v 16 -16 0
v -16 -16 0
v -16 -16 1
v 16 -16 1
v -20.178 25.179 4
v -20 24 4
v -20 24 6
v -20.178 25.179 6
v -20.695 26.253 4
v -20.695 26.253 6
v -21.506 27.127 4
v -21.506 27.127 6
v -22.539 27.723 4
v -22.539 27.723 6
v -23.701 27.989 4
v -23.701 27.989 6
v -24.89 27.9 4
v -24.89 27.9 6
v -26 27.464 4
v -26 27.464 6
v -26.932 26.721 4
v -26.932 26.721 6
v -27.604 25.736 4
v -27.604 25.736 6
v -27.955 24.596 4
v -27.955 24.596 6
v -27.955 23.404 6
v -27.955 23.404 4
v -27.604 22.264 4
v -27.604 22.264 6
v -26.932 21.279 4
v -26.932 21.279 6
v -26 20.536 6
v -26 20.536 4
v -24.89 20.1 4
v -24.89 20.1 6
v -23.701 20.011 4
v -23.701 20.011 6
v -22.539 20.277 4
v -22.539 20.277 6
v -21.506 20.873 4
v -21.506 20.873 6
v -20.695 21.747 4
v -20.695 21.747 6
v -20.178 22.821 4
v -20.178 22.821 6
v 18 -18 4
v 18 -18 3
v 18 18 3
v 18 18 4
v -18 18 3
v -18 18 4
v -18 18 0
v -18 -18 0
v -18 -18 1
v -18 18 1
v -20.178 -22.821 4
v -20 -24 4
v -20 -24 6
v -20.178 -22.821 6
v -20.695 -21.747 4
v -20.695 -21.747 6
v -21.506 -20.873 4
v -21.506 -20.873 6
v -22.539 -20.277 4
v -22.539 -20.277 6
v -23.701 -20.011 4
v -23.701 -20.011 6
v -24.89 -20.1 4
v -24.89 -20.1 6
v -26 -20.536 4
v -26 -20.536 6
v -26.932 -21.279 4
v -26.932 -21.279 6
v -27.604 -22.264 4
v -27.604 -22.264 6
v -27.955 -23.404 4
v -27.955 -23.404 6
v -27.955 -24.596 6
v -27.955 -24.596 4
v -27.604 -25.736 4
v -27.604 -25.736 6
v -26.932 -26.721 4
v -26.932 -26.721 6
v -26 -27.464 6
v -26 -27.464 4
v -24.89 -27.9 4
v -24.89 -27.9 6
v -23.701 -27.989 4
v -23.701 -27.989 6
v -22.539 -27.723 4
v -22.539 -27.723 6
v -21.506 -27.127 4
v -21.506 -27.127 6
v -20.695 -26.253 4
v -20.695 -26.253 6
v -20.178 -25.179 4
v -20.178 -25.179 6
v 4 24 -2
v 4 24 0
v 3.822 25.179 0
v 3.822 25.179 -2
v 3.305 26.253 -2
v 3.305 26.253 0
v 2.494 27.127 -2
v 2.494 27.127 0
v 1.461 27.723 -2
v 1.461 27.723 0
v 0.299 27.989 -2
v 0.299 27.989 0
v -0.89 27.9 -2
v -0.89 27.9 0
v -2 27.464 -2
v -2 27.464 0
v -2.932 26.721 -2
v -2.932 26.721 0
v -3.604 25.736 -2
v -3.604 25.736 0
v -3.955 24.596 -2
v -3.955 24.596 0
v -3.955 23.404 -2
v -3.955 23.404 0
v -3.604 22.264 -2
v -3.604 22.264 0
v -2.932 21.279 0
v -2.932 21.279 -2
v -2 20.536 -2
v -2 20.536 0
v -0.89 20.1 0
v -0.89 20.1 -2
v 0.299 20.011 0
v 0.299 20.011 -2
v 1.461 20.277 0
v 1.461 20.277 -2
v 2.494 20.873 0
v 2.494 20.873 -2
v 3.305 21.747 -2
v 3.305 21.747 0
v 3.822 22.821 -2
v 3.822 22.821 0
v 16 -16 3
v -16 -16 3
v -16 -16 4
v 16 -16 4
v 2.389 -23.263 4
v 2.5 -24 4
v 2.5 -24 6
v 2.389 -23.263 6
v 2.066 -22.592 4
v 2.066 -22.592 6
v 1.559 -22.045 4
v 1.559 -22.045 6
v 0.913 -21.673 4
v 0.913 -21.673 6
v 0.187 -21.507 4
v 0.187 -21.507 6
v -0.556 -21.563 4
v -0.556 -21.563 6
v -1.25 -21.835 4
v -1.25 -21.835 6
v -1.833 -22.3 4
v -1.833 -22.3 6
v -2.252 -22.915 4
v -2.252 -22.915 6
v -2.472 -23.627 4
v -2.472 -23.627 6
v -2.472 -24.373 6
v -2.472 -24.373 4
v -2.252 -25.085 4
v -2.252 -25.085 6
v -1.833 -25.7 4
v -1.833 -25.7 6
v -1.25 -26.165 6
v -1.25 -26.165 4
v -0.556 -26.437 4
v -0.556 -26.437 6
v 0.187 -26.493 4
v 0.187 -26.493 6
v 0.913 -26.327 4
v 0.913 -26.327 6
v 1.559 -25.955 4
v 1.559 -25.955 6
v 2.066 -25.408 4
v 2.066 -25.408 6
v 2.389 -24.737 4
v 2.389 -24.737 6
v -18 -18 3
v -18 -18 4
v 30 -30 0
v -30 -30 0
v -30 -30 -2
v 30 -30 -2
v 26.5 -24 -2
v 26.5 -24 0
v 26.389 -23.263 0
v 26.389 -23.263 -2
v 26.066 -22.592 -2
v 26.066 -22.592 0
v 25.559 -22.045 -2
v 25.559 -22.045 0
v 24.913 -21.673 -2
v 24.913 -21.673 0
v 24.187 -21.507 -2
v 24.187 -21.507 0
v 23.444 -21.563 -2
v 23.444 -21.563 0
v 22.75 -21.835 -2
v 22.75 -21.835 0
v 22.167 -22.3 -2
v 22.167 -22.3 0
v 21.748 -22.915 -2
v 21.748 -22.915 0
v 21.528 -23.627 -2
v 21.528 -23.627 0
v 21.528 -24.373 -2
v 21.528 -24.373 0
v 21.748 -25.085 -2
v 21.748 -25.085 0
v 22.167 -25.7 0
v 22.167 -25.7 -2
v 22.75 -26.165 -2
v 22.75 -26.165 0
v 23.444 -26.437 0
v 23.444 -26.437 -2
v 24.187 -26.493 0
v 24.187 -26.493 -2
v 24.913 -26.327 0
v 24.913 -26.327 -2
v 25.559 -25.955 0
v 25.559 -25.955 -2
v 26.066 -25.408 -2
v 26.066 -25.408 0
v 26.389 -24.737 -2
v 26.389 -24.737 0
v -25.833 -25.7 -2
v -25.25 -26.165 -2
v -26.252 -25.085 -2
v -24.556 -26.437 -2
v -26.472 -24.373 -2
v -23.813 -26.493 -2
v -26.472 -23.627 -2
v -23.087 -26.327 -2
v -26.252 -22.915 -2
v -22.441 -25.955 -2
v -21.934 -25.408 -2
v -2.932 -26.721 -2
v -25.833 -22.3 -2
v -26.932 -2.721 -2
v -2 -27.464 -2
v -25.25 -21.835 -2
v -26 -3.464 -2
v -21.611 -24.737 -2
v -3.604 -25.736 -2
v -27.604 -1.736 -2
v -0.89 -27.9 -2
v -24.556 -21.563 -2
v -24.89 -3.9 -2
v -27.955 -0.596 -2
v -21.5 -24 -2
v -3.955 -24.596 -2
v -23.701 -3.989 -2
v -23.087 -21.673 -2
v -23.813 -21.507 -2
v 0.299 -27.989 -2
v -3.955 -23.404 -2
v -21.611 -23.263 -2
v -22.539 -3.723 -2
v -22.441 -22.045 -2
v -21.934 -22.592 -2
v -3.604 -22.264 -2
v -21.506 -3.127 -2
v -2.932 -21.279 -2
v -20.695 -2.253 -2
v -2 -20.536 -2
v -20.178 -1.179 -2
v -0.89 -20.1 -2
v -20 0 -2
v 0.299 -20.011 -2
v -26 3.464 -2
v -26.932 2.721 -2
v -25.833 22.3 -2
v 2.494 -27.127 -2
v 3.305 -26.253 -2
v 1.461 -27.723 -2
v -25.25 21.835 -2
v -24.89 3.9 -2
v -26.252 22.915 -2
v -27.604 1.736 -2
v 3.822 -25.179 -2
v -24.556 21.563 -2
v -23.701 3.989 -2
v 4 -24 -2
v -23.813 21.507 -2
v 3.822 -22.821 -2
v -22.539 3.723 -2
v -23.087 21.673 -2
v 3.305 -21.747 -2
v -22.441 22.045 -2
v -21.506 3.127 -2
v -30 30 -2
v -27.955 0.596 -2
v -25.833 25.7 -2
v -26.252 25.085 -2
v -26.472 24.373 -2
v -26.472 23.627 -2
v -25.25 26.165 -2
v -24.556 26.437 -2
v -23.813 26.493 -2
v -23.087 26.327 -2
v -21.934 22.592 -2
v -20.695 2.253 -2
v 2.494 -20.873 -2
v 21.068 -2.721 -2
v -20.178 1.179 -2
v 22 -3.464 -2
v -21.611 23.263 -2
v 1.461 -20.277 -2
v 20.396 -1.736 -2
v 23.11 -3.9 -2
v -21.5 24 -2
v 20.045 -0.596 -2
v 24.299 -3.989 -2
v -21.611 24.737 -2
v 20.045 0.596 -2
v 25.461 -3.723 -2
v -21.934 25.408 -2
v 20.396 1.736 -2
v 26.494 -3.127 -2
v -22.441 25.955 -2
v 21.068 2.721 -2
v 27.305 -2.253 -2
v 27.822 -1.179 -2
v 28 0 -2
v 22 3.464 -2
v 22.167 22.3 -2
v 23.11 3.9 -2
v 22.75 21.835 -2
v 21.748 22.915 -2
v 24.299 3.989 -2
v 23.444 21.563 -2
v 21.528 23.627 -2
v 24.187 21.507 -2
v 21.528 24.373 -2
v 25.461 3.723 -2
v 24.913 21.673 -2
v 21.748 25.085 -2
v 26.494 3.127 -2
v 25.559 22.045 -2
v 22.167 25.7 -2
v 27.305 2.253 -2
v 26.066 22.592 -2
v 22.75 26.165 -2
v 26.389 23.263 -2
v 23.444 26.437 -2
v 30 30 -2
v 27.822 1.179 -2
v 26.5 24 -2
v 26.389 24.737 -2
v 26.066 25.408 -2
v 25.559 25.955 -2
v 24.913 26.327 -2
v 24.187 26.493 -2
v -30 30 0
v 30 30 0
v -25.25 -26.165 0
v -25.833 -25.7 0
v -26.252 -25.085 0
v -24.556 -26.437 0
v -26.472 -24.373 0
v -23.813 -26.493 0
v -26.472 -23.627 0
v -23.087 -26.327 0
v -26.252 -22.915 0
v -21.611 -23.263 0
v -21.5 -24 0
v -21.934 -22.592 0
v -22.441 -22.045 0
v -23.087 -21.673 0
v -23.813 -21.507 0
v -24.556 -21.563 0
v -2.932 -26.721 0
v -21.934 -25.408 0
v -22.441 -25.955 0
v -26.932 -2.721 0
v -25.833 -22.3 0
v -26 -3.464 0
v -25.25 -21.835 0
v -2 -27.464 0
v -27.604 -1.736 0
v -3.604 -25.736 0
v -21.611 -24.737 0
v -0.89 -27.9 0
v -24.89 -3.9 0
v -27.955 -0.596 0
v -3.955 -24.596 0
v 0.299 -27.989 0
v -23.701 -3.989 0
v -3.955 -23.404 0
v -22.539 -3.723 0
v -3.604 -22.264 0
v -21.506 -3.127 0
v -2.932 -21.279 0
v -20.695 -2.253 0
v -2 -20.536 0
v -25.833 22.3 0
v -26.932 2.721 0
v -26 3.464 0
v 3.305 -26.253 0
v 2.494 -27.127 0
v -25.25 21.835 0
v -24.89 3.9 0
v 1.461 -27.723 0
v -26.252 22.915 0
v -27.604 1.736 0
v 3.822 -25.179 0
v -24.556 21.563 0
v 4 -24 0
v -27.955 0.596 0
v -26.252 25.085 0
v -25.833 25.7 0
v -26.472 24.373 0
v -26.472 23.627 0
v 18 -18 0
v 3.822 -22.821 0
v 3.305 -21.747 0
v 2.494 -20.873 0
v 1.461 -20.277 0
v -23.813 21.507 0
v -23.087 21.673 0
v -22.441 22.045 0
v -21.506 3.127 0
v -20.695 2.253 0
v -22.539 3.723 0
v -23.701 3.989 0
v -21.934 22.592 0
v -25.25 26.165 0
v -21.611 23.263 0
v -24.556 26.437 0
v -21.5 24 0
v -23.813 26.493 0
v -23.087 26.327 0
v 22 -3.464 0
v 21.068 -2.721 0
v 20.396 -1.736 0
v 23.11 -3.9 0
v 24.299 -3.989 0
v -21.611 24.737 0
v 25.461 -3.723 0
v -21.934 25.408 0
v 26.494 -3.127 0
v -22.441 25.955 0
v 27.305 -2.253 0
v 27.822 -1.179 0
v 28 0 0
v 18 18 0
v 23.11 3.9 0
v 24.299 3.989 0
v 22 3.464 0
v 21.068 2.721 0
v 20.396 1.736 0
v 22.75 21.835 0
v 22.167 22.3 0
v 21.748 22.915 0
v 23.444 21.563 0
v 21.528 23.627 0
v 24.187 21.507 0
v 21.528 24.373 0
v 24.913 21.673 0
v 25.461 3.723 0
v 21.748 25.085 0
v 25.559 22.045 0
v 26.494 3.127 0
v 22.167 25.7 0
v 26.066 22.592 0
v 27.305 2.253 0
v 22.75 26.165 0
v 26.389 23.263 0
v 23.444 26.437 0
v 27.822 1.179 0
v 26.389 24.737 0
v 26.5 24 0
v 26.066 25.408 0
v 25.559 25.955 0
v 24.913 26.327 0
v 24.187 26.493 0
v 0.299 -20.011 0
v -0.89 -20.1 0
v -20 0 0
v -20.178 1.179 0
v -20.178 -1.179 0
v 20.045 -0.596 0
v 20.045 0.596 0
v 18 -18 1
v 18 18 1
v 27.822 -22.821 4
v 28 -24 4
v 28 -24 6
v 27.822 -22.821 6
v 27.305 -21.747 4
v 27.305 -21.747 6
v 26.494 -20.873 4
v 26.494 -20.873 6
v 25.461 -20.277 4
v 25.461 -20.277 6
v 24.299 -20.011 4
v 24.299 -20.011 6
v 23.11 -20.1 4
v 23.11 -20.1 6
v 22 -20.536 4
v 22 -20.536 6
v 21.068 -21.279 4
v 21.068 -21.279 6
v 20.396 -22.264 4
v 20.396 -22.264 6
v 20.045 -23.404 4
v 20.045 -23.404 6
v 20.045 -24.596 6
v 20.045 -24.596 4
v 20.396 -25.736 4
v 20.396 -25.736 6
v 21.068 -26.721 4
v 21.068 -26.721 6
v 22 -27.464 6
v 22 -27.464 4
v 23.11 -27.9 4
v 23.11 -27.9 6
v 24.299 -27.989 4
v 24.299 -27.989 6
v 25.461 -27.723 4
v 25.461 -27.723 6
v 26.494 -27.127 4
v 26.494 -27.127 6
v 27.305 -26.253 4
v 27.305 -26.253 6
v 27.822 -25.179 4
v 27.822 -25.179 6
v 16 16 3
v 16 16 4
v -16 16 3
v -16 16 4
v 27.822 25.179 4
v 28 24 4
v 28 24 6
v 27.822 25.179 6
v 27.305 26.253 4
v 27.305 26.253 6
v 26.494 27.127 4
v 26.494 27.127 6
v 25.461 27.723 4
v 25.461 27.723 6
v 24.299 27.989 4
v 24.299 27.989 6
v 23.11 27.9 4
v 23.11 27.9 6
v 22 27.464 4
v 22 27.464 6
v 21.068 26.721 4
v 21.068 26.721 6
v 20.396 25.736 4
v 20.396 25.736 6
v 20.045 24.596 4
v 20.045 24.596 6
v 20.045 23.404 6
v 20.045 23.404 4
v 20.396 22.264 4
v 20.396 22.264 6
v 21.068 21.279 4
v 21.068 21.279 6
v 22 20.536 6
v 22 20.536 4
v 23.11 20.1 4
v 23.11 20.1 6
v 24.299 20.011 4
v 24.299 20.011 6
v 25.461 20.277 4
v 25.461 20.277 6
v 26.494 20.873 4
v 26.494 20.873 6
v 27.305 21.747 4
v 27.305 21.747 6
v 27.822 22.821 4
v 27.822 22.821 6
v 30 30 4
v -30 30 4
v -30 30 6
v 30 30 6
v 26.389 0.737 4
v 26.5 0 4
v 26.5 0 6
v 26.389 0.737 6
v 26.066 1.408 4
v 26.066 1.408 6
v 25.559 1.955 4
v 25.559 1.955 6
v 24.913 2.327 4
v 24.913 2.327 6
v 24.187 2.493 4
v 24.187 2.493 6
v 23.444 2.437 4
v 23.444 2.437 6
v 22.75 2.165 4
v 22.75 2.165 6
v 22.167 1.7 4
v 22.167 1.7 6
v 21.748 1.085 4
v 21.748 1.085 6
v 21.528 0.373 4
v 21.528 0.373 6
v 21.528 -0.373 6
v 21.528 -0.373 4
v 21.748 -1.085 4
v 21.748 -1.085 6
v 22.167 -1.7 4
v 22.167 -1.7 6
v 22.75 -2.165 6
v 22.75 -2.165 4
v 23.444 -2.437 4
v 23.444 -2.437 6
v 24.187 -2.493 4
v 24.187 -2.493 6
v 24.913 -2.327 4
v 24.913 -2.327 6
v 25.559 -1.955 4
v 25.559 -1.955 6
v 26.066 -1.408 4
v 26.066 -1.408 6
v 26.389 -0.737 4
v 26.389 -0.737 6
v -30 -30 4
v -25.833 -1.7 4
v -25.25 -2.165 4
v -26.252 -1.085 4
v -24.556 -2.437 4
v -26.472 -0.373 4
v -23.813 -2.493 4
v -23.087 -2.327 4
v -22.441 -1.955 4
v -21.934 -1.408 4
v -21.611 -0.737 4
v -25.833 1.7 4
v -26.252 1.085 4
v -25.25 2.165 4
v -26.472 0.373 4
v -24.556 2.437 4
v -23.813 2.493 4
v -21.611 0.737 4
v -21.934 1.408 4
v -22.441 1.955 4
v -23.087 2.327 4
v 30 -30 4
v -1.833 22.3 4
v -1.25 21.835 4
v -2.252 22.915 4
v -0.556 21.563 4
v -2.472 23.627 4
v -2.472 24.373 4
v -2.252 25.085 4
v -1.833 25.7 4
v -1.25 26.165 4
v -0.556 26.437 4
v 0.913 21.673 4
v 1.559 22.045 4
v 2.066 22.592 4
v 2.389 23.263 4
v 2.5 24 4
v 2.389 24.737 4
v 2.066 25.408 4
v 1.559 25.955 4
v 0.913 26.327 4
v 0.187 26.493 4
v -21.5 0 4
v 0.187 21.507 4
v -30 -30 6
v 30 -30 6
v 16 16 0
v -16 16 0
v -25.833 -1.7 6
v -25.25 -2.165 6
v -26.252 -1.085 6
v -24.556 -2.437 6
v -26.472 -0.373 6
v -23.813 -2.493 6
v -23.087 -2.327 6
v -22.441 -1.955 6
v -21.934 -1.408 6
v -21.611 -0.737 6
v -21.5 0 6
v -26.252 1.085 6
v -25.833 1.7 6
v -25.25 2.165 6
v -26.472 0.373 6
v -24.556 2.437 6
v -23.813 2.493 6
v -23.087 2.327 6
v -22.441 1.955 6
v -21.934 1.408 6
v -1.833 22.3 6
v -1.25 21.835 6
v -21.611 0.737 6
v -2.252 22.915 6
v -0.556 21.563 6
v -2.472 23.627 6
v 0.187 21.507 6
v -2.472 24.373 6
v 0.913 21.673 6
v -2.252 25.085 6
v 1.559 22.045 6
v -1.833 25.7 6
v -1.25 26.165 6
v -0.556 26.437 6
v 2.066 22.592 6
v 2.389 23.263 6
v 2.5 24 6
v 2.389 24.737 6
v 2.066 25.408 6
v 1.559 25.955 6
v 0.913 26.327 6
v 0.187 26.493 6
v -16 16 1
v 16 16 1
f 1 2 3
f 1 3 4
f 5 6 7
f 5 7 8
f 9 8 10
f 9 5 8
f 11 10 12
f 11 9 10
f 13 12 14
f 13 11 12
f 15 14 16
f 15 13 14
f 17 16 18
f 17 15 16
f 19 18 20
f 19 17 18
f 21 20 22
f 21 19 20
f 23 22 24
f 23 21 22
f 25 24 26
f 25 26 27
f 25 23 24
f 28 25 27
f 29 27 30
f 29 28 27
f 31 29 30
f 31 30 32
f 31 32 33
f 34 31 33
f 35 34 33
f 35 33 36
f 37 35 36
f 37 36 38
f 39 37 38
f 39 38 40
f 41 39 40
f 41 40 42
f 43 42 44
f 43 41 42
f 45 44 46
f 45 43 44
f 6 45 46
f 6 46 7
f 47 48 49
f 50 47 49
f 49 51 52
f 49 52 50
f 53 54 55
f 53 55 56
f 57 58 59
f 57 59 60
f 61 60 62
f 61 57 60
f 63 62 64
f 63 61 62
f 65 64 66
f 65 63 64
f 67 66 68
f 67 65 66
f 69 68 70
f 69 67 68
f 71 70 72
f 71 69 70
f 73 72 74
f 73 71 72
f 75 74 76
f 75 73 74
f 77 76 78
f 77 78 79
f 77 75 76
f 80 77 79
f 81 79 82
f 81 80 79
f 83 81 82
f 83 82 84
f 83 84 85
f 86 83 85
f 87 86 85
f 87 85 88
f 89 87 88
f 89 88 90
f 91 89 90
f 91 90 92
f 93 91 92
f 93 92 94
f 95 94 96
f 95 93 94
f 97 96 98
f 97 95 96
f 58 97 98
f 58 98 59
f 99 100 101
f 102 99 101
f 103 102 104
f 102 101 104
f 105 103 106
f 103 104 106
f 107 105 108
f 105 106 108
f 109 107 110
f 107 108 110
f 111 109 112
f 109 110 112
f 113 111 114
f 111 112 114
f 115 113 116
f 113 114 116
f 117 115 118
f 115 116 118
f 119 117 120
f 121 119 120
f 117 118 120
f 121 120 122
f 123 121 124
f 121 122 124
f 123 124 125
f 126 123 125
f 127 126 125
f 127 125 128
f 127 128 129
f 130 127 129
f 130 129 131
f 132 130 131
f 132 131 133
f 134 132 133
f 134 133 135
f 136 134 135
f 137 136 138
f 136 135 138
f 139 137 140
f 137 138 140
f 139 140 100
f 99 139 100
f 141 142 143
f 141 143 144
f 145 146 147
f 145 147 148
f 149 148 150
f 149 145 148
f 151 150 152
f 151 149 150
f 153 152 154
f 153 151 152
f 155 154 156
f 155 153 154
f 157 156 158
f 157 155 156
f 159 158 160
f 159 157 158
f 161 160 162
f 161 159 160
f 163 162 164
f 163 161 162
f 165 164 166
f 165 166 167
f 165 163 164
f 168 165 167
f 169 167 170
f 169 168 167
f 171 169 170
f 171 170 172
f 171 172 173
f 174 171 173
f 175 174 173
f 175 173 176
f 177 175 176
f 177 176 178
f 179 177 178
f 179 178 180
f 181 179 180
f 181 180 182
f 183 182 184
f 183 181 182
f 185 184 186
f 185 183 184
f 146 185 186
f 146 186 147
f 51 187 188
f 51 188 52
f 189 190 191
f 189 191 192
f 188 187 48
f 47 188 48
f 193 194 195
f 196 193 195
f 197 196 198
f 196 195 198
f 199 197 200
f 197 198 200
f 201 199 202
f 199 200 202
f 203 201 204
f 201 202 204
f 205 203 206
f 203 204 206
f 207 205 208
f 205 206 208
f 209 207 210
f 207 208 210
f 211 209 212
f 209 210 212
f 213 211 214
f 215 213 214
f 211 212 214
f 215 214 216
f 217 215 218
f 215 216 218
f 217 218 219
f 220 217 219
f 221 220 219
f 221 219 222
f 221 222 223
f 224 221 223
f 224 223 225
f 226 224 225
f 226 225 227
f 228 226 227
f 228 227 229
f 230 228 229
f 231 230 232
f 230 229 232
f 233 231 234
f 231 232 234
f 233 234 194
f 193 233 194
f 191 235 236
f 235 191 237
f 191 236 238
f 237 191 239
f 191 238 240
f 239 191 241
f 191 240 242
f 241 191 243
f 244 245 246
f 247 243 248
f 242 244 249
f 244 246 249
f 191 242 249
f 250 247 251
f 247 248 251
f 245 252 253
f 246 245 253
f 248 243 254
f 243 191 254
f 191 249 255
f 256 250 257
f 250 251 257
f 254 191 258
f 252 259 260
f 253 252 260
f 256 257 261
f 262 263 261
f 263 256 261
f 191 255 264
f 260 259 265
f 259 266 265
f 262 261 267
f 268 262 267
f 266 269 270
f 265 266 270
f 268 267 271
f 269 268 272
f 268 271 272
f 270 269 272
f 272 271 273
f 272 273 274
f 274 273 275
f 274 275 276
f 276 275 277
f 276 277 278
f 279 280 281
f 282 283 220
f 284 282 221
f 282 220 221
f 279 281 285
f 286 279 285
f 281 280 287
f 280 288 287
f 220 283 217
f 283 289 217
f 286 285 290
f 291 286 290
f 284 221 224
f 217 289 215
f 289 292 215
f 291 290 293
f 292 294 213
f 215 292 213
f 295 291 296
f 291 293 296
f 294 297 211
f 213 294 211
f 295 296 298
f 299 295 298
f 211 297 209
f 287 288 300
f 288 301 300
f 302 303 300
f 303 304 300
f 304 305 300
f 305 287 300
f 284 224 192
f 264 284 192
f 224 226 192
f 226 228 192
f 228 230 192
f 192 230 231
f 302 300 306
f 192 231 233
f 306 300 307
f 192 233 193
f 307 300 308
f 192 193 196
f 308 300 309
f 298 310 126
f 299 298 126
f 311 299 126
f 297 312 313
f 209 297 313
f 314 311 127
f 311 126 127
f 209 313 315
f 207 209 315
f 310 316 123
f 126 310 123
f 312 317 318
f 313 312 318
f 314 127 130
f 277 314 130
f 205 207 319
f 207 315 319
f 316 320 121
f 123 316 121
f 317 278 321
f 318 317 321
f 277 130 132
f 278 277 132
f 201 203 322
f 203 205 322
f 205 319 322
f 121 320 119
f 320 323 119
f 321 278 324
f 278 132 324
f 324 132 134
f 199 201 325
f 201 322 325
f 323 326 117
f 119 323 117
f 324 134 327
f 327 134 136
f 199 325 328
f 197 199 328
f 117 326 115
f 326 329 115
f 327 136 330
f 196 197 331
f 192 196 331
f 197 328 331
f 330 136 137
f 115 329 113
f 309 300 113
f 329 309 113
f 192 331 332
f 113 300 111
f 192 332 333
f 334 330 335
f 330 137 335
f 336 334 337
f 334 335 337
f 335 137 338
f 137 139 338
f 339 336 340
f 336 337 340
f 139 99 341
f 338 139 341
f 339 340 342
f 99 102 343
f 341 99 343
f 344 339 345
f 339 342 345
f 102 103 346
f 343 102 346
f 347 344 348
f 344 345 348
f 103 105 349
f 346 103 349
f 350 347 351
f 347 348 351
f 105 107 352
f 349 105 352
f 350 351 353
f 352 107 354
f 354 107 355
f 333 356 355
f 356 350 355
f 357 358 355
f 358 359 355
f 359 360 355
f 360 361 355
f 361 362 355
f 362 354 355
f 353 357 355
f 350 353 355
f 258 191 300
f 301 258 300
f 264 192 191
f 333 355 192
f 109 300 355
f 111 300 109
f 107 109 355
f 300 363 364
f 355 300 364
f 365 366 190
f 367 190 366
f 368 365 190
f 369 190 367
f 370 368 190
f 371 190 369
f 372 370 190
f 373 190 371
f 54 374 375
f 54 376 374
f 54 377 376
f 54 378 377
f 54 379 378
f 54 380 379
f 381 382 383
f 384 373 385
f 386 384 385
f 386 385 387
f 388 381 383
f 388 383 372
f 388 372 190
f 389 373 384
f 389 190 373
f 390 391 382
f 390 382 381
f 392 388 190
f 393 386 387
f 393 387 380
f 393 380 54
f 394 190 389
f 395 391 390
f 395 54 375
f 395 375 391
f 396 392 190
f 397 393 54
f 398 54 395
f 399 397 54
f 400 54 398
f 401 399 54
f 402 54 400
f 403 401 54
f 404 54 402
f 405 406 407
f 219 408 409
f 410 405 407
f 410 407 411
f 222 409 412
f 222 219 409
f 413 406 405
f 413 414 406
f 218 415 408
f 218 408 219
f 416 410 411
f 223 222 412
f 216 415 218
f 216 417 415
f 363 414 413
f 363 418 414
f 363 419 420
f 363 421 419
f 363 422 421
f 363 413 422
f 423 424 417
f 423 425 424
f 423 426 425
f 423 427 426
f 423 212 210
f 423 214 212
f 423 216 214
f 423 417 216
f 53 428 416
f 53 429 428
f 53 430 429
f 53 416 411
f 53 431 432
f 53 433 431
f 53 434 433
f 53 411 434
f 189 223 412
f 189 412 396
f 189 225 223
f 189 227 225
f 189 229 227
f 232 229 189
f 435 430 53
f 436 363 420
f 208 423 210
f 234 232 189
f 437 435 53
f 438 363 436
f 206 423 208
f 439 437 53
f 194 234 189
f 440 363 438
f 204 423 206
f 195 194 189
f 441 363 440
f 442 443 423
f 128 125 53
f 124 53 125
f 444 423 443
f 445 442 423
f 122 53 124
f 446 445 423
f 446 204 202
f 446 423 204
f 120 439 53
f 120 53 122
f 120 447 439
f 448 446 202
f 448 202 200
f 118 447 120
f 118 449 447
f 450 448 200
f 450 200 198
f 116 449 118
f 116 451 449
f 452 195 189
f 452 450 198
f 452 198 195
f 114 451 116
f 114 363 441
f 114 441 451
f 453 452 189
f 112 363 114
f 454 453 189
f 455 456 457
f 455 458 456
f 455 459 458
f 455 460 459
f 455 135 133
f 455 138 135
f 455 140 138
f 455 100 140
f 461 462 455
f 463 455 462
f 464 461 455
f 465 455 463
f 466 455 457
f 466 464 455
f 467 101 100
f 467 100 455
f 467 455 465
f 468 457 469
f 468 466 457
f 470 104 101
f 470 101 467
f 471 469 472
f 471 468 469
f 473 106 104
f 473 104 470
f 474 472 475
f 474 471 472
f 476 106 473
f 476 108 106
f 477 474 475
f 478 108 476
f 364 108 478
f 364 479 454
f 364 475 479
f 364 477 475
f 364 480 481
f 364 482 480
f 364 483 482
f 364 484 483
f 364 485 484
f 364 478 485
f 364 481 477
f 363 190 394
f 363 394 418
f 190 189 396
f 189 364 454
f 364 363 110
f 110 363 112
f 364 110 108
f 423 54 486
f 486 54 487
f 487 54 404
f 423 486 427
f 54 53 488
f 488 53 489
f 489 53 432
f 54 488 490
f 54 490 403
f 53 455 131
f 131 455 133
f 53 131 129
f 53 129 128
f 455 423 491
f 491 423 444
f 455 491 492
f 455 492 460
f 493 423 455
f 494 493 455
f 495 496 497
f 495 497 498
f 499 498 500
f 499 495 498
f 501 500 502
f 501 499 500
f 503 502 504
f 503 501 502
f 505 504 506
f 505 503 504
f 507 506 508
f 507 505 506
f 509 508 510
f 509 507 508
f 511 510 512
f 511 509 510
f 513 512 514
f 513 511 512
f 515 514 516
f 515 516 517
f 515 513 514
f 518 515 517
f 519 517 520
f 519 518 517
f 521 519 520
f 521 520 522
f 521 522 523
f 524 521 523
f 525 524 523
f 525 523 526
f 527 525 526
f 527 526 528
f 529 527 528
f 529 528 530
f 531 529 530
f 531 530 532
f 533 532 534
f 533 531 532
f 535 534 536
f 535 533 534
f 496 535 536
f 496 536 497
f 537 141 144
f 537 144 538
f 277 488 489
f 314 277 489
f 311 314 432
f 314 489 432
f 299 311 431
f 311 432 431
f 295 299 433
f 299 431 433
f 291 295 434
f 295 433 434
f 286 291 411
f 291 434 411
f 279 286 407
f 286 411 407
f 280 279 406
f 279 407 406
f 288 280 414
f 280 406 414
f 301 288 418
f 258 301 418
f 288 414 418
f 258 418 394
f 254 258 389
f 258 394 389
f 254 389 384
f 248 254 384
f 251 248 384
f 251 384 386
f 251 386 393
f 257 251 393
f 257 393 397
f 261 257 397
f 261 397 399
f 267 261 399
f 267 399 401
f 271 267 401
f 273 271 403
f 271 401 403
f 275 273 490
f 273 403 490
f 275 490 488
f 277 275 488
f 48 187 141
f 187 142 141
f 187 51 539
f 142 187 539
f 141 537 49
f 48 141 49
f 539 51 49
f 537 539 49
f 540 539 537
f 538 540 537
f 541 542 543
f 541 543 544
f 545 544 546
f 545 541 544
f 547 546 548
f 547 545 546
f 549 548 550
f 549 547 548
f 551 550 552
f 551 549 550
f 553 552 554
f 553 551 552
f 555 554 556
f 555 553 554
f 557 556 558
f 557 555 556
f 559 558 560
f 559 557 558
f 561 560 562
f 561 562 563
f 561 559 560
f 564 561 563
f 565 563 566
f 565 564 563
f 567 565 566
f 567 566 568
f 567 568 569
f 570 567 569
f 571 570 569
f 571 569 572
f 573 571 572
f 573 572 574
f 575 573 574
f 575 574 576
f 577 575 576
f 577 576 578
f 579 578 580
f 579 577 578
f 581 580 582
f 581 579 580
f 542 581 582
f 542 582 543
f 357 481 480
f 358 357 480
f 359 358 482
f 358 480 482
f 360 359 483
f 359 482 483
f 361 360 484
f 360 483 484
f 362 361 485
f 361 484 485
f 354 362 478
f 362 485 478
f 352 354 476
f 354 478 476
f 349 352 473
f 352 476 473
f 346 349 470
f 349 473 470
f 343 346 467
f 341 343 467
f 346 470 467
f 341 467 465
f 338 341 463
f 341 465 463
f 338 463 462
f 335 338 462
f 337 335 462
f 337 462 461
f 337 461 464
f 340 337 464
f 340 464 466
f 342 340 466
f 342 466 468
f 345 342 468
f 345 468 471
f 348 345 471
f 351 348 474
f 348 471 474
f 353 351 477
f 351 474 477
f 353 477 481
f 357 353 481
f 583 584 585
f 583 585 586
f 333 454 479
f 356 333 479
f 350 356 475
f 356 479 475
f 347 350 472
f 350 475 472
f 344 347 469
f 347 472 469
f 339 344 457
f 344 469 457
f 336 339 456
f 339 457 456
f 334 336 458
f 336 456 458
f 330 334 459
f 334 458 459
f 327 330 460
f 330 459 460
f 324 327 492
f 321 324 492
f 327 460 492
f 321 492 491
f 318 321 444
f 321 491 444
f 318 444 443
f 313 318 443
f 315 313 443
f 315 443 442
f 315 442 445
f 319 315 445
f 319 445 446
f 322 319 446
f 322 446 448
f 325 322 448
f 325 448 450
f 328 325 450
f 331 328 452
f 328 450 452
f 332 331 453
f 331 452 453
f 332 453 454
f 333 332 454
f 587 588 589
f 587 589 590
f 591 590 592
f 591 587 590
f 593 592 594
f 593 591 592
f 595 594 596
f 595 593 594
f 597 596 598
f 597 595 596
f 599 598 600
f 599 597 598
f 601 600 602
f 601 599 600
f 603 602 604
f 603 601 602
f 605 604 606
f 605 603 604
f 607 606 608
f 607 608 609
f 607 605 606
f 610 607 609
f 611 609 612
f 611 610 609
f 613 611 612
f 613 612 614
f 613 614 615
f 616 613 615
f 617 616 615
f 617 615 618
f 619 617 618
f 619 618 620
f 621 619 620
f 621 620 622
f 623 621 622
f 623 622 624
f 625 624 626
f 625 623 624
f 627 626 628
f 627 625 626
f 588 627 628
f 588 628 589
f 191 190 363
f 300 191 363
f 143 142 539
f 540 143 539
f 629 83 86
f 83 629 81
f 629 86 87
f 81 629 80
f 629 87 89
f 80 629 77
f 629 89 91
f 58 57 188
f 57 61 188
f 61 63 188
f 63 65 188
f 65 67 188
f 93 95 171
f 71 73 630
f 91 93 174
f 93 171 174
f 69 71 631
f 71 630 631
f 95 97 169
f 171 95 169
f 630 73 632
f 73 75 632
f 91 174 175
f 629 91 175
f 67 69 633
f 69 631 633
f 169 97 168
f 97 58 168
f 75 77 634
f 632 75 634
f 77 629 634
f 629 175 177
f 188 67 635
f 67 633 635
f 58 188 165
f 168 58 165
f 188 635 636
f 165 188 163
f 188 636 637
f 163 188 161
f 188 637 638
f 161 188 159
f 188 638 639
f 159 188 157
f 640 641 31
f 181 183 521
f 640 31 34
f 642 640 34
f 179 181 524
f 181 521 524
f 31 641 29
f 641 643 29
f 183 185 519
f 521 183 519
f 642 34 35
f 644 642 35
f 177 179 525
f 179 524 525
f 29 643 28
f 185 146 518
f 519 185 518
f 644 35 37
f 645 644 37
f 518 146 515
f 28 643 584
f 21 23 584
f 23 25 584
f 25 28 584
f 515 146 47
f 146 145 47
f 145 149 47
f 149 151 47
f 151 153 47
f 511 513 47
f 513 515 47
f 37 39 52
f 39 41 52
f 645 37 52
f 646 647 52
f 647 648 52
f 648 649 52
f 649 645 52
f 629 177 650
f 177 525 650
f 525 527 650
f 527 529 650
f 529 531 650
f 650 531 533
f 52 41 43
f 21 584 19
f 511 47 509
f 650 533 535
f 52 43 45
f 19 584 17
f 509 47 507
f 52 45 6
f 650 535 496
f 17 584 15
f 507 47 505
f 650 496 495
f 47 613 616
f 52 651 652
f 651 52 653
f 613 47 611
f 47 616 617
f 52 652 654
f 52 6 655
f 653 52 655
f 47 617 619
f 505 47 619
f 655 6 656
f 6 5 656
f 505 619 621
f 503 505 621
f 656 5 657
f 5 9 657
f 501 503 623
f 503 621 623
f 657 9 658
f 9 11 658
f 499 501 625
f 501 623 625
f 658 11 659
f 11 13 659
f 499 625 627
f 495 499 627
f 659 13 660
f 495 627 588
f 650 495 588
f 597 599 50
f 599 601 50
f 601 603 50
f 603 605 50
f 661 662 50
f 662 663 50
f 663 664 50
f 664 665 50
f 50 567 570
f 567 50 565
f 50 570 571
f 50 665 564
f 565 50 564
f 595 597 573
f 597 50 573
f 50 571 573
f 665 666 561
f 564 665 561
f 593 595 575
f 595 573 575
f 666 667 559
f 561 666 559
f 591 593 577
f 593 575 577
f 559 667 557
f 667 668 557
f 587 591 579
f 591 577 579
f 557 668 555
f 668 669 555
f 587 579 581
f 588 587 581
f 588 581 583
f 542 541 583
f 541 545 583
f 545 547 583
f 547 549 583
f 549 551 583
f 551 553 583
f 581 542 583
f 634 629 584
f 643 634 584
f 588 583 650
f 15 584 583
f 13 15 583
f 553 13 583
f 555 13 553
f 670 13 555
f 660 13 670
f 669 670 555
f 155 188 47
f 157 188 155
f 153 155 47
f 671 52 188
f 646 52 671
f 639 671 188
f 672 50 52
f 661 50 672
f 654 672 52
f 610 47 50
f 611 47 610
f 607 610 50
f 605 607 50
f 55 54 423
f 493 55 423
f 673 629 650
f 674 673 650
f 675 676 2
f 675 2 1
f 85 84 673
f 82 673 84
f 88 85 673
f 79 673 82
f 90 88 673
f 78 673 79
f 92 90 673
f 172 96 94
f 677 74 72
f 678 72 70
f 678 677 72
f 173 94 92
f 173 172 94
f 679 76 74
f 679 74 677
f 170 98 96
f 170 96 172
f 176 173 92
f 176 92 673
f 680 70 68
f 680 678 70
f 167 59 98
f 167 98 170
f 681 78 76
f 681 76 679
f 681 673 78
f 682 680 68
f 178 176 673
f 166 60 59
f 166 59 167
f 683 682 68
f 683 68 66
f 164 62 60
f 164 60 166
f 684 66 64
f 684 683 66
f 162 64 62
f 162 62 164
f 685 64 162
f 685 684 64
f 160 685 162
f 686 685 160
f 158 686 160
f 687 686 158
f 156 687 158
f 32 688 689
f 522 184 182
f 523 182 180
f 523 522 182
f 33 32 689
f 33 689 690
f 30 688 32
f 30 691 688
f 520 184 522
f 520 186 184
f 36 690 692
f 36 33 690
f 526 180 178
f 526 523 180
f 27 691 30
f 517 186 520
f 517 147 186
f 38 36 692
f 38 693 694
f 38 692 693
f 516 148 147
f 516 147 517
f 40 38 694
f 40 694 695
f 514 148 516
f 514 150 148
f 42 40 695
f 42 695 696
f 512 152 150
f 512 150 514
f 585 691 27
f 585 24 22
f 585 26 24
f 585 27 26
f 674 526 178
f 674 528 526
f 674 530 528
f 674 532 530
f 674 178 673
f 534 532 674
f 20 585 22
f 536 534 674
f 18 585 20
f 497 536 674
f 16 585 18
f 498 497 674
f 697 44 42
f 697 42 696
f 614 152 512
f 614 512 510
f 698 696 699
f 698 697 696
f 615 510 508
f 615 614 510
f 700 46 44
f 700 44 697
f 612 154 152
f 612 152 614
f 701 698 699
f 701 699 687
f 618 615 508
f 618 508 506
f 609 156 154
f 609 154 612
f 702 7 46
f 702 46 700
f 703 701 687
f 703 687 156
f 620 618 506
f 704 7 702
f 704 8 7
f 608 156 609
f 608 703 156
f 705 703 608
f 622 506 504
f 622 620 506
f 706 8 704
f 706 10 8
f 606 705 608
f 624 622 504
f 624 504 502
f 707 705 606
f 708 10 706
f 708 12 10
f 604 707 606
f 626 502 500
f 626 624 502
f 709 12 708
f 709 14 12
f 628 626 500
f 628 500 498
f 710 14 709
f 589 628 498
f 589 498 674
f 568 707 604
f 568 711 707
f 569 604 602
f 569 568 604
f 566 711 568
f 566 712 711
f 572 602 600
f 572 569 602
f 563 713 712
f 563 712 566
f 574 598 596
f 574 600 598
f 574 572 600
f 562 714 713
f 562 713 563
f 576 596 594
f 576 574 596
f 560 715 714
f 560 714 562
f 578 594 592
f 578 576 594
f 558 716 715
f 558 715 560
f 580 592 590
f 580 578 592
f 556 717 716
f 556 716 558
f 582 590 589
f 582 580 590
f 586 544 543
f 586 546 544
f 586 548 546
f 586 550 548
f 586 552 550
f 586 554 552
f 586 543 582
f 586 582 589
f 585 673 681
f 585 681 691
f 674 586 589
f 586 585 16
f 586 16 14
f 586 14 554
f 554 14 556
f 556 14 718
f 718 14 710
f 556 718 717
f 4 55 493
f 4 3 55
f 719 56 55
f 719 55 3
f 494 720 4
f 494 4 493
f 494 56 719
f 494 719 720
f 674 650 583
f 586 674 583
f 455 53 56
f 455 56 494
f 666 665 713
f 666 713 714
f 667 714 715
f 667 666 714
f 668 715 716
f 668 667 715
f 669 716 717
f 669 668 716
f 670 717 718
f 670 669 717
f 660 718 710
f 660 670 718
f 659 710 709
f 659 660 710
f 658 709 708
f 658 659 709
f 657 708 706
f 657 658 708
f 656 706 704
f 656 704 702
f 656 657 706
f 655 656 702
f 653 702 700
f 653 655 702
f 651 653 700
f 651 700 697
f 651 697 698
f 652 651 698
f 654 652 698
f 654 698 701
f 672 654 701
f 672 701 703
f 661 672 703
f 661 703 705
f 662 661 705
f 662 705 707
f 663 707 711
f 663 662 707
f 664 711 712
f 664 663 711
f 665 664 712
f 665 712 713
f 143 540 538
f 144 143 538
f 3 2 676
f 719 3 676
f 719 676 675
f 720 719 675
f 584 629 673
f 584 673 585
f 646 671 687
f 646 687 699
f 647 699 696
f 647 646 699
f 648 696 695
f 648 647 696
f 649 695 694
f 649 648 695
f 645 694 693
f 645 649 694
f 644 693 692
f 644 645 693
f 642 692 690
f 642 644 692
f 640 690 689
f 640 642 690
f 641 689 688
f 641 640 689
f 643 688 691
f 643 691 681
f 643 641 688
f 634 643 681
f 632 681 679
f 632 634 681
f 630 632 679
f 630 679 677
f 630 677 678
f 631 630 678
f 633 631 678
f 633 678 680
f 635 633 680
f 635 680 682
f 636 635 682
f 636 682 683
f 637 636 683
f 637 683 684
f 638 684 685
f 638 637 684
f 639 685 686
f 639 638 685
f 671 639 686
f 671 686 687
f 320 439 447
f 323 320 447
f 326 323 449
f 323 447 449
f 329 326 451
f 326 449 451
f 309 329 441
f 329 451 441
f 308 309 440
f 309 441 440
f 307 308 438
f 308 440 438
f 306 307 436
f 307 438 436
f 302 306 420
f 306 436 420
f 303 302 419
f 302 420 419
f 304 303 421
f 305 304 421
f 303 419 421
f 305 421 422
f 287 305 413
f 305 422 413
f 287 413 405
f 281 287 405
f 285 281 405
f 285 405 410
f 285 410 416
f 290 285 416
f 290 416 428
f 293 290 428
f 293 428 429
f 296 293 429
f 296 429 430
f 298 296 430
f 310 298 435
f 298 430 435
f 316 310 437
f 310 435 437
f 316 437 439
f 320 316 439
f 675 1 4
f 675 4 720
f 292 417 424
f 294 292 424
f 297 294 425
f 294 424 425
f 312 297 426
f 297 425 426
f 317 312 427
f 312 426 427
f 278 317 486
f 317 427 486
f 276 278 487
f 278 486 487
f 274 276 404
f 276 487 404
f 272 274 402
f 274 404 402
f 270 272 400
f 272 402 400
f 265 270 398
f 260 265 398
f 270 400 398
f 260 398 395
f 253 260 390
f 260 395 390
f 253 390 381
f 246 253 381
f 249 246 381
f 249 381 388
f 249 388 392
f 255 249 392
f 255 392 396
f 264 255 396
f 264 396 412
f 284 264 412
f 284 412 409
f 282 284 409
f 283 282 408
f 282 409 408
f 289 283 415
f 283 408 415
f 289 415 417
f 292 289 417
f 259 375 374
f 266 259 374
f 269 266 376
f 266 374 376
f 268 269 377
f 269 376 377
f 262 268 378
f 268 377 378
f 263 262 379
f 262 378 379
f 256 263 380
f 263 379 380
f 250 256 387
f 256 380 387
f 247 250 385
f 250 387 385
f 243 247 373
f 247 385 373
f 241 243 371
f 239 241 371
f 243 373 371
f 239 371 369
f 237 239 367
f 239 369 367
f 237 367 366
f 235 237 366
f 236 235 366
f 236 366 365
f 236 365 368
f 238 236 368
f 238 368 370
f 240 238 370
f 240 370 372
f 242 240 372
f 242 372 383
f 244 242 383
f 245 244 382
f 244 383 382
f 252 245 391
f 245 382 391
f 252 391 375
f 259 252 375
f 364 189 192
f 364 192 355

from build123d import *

# Parameters (mm, degrees)
F0_W     = 60
F0_H     = 60
F0_R     = 4
F0_W_2   = 36
F0_H_2   = 36
F0_W_3   = 32
F0_H_3   = 32
F0_R_2   = 2.5
F1_DEPTH = 2
F2_DEPTH = 1
F3_START = 4
F3_DEPTH = 2
F4_START = 3
F4_DEPTH = 1


with BuildPart() as f1:
    # F0 (on Top) → F1 (new body)
    with BuildSketch(Plane.XY):
        Rectangle(F0_W, F0_H)
        with Locations((-24, -24)):
            Circle(F0_R, mode=Mode.SUBTRACT)
        with Locations((0, -24)):
            Circle(F0_R, mode=Mode.SUBTRACT)
        with Locations((24, -24)):
            Circle(F0_R, mode=Mode.SUBTRACT)
        with Locations((-24, 0)):
            Circle(F0_R, mode=Mode.SUBTRACT)
        with Locations((-24, 24)):
            Circle(F0_R, mode=Mode.SUBTRACT)
        Rectangle(F0_W_2, F0_H_2, mode=Mode.SUBTRACT)
        with Locations((24, 0)):
            Circle(F0_R, mode=Mode.SUBTRACT)
        with Locations((0, 24)):
            Circle(F0_R, mode=Mode.SUBTRACT)
        with Locations((24, 24)):
            Circle(F0_R, mode=Mode.SUBTRACT)
        Rectangle(F0_W_2, F0_H_2)
        Rectangle(F0_W_3, F0_H_3, mode=Mode.SUBTRACT)
        Rectangle(F0_W_3, F0_H_3)
        with Locations((-24, 24)):
            Circle(F0_R)
        with Locations((-24, 24)):
            Circle(F0_R_2, mode=Mode.SUBTRACT)
        with Locations((24, 24)):
            Circle(F0_R)
        with Locations((24, 24)):
            Circle(F0_R_2, mode=Mode.SUBTRACT)
        with Locations((24, -24)):
            Circle(F0_R)
        with Locations((24, -24)):
            Circle(F0_R_2, mode=Mode.SUBTRACT)
        with Locations((-24, -24)):
            Circle(F0_R)
        with Locations((-24, -24)):
            Circle(F0_R_2, mode=Mode.SUBTRACT)
    extrude(amount=-F1_DEPTH)

    # F0 (on Top) → F2 (join)
    with BuildSketch(Plane.XY):
        Rectangle(F0_W_2, F0_H_2)
        Rectangle(F0_W_3, F0_H_3, mode=Mode.SUBTRACT)
    extrude(amount=F2_DEPTH)


with BuildPart() as f3:
    # F0 (on Top) → F3 (new body)
    with BuildSketch(Plane.XY.offset(F3_START)):
        Rectangle(F0_W, F0_H)
        with Locations((-24, -24)):
            Circle(F0_R, mode=Mode.SUBTRACT)
        with Locations((0, -24)):
            Circle(F0_R, mode=Mode.SUBTRACT)
        with Locations((24, -24)):
            Circle(F0_R, mode=Mode.SUBTRACT)
        with Locations((-24, 0)):
            Circle(F0_R, mode=Mode.SUBTRACT)
        with Locations((-24, 24)):
            Circle(F0_R, mode=Mode.SUBTRACT)
        Rectangle(F0_W_2, F0_H_2, mode=Mode.SUBTRACT)
        with Locations((24, 0)):
            Circle(F0_R, mode=Mode.SUBTRACT)
        with Locations((0, 24)):
            Circle(F0_R, mode=Mode.SUBTRACT)
        with Locations((24, 24)):
            Circle(F0_R, mode=Mode.SUBTRACT)
        Rectangle(F0_W_2, F0_H_2)
        Rectangle(F0_W_3, F0_H_3, mode=Mode.SUBTRACT)
        Rectangle(F0_W_3, F0_H_3)
        with Locations((-24, 0)):
            Circle(F0_R)
        with Locations((-24, 0)):
            Circle(F0_R_2, mode=Mode.SUBTRACT)
        with Locations((0, 24)):
            Circle(F0_R)
        with Locations((0, 24)):
            Circle(F0_R_2, mode=Mode.SUBTRACT)
        with Locations((24, 0)):
            Circle(F0_R)
        with Locations((24, 0)):
            Circle(F0_R_2, mode=Mode.SUBTRACT)
        with Locations((0, -24)):
            Circle(F0_R)
        with Locations((0, -24)):
            Circle(F0_R_2, mode=Mode.SUBTRACT)
    extrude(amount=F3_DEPTH)

    # F0 (on Top) → F4 (join)
    with BuildSketch(Plane.XY.offset(F4_START)):
        Rectangle(F0_W_2, F0_H_2)
        Rectangle(F0_W_3, F0_H_3, mode=Mode.SUBTRACT)
    extrude(amount=F4_DEPTH)


solid = Compound([f1.part, f3.part])
